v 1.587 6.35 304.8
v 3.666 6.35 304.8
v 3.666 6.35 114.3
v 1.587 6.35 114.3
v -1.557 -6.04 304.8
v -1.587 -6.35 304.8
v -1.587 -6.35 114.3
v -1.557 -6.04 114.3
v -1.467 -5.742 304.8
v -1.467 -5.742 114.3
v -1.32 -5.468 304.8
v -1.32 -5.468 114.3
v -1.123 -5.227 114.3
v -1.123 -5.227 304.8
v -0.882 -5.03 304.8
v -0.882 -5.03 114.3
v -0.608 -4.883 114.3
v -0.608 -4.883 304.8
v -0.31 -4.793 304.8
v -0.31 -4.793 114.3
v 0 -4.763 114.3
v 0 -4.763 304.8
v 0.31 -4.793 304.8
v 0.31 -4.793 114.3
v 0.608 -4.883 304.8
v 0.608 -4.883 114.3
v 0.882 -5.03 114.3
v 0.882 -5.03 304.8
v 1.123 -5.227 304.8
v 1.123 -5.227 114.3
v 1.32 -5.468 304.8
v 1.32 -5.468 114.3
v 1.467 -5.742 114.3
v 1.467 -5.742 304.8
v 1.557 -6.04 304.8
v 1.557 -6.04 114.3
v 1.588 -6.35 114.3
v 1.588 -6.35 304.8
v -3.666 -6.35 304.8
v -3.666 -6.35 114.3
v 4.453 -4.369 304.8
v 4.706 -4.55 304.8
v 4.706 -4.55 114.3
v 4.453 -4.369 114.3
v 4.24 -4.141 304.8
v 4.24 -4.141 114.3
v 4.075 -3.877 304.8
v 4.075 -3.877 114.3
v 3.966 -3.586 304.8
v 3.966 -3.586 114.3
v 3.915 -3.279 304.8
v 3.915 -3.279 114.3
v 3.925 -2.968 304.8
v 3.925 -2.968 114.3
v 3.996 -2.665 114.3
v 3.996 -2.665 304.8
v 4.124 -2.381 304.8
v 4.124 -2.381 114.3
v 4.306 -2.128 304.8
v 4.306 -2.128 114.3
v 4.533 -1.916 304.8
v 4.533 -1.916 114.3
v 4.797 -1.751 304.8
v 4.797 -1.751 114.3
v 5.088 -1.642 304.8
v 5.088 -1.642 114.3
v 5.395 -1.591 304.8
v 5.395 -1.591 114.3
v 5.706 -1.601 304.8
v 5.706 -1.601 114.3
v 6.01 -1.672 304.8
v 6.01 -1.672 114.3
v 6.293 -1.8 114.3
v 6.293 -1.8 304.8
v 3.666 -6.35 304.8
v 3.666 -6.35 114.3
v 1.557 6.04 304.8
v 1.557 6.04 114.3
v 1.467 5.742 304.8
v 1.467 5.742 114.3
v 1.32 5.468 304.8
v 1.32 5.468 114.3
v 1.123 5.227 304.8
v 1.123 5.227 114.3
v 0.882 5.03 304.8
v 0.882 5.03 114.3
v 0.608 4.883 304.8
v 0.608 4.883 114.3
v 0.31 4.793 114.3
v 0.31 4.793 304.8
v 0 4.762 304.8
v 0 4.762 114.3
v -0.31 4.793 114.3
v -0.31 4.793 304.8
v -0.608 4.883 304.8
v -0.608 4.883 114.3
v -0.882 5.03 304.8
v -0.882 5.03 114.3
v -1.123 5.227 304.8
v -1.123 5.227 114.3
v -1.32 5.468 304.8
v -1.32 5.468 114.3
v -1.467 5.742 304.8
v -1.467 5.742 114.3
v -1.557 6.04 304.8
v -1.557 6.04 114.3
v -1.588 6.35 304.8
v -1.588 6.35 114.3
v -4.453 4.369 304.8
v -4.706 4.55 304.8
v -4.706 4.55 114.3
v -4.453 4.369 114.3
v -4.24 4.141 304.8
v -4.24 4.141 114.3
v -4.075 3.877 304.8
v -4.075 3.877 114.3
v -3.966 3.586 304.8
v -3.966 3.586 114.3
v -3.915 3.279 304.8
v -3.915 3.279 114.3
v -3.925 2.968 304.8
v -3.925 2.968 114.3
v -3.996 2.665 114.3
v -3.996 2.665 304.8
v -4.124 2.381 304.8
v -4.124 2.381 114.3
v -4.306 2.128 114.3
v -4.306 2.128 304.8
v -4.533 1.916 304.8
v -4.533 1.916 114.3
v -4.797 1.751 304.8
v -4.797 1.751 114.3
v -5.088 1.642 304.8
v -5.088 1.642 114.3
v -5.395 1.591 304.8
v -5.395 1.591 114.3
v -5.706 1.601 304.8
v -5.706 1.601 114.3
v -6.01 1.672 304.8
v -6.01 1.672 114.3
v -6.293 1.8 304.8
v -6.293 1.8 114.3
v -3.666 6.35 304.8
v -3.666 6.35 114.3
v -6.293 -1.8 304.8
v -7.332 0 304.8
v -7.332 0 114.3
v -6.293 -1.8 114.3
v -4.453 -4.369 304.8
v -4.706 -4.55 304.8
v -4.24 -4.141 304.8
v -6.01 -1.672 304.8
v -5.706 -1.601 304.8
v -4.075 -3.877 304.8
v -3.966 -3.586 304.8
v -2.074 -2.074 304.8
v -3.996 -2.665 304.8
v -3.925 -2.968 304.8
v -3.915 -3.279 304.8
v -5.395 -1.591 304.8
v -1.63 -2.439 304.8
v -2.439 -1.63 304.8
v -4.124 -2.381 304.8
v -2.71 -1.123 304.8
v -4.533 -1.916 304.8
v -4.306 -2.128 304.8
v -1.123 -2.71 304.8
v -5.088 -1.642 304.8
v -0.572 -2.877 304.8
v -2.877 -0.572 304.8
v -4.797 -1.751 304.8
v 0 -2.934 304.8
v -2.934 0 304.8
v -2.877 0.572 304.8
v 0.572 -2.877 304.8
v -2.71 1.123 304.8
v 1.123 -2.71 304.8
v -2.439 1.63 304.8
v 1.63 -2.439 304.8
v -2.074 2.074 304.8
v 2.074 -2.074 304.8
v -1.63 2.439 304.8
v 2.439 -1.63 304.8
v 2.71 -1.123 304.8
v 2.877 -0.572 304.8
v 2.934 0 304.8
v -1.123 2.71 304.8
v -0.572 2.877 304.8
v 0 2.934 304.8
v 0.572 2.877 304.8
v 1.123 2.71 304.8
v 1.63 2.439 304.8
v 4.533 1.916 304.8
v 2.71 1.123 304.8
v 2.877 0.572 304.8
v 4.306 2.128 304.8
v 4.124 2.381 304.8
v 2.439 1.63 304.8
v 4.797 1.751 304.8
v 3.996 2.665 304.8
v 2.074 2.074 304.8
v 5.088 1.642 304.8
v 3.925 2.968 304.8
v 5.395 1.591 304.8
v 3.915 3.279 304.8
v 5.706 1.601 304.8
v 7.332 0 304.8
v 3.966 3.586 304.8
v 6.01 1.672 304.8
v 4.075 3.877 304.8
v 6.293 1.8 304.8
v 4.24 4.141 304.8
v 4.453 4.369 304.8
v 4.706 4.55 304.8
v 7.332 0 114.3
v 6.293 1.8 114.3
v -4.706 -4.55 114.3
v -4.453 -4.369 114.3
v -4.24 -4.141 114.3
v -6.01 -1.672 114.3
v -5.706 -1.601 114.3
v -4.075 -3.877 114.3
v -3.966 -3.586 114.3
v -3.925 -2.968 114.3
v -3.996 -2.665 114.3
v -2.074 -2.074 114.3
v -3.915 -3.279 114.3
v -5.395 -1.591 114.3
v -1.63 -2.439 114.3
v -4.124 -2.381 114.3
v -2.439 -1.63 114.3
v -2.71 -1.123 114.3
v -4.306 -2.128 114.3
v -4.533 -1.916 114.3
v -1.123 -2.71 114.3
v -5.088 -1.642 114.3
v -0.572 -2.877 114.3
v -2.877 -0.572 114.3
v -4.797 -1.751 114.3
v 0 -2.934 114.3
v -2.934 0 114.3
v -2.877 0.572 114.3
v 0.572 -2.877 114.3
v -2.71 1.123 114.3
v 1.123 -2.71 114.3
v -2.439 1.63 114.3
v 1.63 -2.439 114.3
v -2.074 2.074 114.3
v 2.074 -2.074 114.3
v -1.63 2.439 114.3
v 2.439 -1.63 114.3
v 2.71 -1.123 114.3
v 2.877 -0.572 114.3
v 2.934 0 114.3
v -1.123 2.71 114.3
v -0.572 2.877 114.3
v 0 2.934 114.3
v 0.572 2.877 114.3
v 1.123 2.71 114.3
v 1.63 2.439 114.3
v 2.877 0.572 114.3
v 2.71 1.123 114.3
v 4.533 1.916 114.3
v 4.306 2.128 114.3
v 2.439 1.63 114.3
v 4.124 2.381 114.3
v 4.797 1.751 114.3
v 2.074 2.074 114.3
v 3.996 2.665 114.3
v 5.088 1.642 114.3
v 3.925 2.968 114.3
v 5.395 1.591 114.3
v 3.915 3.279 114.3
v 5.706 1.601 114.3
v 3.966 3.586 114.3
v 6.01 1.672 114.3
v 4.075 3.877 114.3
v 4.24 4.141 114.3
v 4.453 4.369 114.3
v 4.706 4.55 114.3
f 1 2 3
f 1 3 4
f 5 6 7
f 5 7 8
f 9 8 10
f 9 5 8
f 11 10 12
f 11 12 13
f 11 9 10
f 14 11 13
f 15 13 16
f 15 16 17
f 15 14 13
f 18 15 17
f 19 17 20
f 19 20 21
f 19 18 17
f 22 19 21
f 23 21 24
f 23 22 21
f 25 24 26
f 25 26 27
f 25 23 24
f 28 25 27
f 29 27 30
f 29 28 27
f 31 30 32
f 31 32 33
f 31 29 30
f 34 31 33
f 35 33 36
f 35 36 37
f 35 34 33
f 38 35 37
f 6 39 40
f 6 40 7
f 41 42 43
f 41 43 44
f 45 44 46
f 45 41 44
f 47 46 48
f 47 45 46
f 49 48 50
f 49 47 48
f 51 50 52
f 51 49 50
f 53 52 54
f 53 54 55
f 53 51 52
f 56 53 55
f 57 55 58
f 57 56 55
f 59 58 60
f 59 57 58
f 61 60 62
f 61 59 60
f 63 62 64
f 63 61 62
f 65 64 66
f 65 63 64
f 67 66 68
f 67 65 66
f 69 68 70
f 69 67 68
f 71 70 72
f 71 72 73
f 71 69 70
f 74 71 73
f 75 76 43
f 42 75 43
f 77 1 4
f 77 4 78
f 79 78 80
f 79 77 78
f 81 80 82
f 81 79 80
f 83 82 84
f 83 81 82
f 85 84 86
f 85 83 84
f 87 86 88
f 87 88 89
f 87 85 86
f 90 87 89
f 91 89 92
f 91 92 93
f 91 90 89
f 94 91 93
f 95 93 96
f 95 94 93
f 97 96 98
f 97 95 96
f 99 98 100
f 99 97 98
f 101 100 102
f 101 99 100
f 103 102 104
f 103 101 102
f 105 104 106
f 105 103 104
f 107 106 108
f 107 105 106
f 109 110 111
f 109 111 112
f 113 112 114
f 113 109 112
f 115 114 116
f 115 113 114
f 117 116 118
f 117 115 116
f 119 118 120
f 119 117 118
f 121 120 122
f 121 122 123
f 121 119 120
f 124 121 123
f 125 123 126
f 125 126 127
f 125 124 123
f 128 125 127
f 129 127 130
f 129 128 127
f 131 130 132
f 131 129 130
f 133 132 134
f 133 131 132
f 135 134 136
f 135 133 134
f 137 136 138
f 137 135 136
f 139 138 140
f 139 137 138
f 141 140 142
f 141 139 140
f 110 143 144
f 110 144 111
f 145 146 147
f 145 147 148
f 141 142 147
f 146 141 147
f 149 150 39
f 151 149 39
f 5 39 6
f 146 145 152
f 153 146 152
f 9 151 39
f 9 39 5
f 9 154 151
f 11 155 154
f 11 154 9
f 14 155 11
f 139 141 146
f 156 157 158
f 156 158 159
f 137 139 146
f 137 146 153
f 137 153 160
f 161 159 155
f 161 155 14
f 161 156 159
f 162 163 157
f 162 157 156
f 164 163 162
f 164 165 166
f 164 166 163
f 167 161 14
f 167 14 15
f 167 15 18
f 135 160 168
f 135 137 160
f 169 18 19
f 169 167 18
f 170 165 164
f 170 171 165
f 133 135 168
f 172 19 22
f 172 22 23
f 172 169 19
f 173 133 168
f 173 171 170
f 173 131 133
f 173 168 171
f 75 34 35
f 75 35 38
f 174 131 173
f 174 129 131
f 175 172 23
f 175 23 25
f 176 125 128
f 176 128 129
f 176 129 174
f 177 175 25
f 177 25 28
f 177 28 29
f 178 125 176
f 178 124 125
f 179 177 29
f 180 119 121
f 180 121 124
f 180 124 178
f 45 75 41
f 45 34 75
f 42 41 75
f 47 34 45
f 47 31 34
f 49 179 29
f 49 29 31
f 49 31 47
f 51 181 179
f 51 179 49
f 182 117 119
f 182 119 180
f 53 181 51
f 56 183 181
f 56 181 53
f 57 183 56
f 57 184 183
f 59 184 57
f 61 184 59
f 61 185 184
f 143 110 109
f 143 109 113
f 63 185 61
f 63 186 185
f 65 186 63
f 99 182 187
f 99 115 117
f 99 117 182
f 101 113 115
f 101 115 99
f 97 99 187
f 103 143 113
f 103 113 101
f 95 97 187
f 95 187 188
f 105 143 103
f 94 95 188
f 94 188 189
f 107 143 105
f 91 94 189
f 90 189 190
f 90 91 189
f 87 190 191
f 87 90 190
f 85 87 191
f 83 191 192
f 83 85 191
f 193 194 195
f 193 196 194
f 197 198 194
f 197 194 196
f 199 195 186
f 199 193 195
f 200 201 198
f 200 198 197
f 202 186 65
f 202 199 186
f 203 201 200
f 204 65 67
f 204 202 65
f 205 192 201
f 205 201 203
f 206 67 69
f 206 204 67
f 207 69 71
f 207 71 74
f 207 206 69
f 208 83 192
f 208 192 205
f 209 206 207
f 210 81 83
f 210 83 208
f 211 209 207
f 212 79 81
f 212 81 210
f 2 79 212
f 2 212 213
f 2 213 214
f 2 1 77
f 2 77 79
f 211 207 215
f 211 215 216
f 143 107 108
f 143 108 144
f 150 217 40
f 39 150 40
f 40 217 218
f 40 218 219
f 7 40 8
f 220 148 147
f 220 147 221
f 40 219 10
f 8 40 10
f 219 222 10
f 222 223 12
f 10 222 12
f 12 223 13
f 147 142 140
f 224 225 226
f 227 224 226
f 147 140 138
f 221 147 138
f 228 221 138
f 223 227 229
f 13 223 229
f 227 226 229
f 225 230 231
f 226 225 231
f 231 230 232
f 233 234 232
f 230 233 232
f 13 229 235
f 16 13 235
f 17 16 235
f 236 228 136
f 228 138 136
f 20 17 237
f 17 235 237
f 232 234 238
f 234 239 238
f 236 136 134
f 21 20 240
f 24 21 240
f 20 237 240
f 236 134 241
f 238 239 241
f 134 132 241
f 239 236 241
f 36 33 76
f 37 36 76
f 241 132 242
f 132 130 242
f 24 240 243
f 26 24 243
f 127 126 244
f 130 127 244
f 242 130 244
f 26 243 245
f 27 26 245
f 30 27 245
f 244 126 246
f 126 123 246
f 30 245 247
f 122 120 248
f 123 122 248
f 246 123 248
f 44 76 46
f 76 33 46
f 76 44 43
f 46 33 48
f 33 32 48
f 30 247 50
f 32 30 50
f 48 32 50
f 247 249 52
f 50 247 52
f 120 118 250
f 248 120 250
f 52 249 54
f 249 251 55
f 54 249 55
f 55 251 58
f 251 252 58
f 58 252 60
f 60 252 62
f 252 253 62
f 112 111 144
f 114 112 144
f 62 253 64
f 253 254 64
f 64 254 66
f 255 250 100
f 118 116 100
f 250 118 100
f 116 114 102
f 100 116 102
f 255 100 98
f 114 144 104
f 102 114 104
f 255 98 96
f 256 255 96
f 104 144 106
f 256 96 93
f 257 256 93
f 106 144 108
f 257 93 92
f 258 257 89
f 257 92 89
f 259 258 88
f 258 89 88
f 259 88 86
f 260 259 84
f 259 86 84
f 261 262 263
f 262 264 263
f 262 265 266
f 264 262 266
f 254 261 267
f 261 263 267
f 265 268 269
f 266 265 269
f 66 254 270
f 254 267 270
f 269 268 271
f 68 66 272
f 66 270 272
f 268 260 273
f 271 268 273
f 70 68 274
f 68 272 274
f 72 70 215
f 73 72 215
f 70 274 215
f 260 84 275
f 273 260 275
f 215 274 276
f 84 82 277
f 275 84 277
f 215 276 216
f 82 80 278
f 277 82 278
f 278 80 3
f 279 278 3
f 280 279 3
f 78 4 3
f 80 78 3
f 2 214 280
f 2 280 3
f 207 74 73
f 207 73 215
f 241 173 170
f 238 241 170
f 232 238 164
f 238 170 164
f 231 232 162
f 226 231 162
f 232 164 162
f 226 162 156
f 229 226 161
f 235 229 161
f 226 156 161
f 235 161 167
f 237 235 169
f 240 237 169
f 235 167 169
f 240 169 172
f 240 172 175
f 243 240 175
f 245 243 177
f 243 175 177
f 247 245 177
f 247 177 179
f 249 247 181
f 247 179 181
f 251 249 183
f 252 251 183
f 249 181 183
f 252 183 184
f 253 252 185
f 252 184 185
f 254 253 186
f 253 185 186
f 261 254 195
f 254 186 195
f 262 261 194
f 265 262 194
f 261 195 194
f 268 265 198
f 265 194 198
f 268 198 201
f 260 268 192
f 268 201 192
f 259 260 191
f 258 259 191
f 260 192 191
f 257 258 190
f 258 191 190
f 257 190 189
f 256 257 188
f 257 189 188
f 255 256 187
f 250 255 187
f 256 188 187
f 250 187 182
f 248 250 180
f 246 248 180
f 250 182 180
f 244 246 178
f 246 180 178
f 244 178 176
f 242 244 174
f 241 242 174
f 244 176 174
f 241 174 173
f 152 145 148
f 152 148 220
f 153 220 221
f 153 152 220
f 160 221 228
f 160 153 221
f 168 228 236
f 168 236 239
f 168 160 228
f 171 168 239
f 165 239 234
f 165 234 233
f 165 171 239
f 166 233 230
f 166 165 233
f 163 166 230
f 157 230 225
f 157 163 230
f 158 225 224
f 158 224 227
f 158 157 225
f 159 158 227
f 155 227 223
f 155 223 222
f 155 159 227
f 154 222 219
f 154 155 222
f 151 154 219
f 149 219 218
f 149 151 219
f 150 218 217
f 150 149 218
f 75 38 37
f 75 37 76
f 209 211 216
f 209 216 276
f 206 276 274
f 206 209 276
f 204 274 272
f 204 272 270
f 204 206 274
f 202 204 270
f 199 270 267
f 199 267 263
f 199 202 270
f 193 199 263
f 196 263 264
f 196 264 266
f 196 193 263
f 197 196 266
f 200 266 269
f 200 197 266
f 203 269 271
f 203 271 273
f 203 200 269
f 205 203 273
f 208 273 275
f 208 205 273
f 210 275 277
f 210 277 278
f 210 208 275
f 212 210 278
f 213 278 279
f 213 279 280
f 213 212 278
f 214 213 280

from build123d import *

# Parameters (mm, degrees)
SKETCH1_R           = 2.9337
BOSS_EXTRUDE1_DEPTH = 190.5


with BuildPart() as part:
    # Sketch1 → Boss-Extrude1 (new body)
    with BuildSketch(Plane.XY.offset(304.8)):
        with BuildLine():
            Line((6.293011699, -1.800184894), (7.332348803, -2.22e-07))
            Line((7.332348803, -2.22e-07), (6.293011439, 1.800184522))
            ThreePointArc((6.293011439, 1.800184522), (4.124446058, 2.381249653), (4.705511189, 4.549815034))
            Line((4.705511189, 4.549815034), (3.666173825, 6.349999778))
            Line((3.666173825, 6.349999778), (1.587499615, 6.349999778))
            ThreePointArc((1.587499615, 6.349999778), (-3.85e-07, 4.762499778), (-1.587500385, 6.349999778))
            Line((-1.587500385, 6.349999778), (-3.666174594, 6.349999778))
            Line((-3.666174594, 6.349999778), (-4.70551159, 4.549815043))
            ThreePointArc((-4.70551159, 4.549815043), (-4.12444613, 2.38124975), (-6.293011423, 1.80018429))
            Line((-6.293011423, 1.80018429), (-7.332348419, -4.44e-07))
            Line((-7.332348419, -4.44e-07), (-6.293011205, -1.800185053))
            ThreePointArc((-6.293011205, -1.800185053), (-4.124445841, -2.38125025), (-4.705511038, -4.549815614))
            Line((-4.705511038, -4.549815614), (-3.666173825, -6.350000222))
            Line((-3.666173825, -6.350000222), (-1.587499615, -6.350000222))
            ThreePointArc((-1.587499615, -6.350000222), (3.85e-07, -4.762500222), (1.587500385, -6.350000222))
            Line((1.587500385, -6.350000222), (3.666174594, -6.350000222))
            Line((3.666174594, -6.350000222), (4.705511699, -4.549815551))
            ThreePointArc((4.705511699, -4.549815551), (4.12444637, -2.381250222), (6.293011699, -1.800184894))
        make_face()
        with Locations(Location((0, 0, 0), (0, 0, 180))):
            Circle(SKETCH1_R, mode=Mode.SUBTRACT)
    extrude(amount=-BOSS_EXTRUDE1_DEPTH)


solid = part.part
